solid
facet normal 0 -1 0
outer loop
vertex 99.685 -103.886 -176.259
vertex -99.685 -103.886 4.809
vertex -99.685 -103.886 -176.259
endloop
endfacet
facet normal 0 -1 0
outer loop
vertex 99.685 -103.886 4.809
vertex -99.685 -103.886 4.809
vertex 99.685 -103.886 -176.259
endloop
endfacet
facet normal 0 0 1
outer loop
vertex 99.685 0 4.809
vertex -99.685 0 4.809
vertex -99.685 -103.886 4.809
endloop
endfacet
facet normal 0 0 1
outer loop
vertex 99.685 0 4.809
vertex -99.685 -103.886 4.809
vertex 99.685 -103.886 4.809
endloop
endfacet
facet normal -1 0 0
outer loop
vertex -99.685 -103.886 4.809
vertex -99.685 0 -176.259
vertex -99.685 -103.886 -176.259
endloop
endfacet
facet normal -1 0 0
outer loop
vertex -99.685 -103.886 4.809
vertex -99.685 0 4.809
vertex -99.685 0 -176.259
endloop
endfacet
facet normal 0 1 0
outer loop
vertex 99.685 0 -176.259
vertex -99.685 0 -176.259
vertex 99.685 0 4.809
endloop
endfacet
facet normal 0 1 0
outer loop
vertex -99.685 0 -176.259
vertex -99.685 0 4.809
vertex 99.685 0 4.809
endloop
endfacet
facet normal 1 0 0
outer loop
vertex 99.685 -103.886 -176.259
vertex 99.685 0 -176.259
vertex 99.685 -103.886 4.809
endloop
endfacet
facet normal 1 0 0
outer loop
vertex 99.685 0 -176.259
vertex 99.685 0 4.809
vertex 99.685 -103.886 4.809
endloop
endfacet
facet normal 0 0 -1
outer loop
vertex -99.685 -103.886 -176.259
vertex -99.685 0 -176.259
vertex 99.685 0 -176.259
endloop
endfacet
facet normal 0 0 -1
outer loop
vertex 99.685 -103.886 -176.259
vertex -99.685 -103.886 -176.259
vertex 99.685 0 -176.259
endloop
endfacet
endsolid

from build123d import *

# Parameters (mm, degrees)
F0_W     = 199.3691921234
F0_H     = 80.7386883534
F1_DEPTH = 103.886
F2_DEPTH = 25.4
F4_DEPTH = 74.93


with BuildPart() as f1:
    # F0 (on Front) → F1 (new body)
    with BuildSketch(Plane.XZ):
        with Locations((0, -35.5599995237)):
            Rectangle(F0_W, F0_H)
    extrude(amount=F1_DEPTH)

    # F2 (add): a face of the model
    f2_faces = [f1.faces().sort_by_distance(p)[0] for p in [
        (0, -51.943, -75.9293437004),
    ]]
    extrude(f2_faces, amount=F2_DEPTH)

    # F4 (add): a face of the model
    f4_faces = [f1.faces().sort_by_distance(p)[0] for p in [
        (0, -51.943, -101.3293437004),
    ]]
    extrude(f4_faces, amount=F4_DEPTH)


solid = f1.part
